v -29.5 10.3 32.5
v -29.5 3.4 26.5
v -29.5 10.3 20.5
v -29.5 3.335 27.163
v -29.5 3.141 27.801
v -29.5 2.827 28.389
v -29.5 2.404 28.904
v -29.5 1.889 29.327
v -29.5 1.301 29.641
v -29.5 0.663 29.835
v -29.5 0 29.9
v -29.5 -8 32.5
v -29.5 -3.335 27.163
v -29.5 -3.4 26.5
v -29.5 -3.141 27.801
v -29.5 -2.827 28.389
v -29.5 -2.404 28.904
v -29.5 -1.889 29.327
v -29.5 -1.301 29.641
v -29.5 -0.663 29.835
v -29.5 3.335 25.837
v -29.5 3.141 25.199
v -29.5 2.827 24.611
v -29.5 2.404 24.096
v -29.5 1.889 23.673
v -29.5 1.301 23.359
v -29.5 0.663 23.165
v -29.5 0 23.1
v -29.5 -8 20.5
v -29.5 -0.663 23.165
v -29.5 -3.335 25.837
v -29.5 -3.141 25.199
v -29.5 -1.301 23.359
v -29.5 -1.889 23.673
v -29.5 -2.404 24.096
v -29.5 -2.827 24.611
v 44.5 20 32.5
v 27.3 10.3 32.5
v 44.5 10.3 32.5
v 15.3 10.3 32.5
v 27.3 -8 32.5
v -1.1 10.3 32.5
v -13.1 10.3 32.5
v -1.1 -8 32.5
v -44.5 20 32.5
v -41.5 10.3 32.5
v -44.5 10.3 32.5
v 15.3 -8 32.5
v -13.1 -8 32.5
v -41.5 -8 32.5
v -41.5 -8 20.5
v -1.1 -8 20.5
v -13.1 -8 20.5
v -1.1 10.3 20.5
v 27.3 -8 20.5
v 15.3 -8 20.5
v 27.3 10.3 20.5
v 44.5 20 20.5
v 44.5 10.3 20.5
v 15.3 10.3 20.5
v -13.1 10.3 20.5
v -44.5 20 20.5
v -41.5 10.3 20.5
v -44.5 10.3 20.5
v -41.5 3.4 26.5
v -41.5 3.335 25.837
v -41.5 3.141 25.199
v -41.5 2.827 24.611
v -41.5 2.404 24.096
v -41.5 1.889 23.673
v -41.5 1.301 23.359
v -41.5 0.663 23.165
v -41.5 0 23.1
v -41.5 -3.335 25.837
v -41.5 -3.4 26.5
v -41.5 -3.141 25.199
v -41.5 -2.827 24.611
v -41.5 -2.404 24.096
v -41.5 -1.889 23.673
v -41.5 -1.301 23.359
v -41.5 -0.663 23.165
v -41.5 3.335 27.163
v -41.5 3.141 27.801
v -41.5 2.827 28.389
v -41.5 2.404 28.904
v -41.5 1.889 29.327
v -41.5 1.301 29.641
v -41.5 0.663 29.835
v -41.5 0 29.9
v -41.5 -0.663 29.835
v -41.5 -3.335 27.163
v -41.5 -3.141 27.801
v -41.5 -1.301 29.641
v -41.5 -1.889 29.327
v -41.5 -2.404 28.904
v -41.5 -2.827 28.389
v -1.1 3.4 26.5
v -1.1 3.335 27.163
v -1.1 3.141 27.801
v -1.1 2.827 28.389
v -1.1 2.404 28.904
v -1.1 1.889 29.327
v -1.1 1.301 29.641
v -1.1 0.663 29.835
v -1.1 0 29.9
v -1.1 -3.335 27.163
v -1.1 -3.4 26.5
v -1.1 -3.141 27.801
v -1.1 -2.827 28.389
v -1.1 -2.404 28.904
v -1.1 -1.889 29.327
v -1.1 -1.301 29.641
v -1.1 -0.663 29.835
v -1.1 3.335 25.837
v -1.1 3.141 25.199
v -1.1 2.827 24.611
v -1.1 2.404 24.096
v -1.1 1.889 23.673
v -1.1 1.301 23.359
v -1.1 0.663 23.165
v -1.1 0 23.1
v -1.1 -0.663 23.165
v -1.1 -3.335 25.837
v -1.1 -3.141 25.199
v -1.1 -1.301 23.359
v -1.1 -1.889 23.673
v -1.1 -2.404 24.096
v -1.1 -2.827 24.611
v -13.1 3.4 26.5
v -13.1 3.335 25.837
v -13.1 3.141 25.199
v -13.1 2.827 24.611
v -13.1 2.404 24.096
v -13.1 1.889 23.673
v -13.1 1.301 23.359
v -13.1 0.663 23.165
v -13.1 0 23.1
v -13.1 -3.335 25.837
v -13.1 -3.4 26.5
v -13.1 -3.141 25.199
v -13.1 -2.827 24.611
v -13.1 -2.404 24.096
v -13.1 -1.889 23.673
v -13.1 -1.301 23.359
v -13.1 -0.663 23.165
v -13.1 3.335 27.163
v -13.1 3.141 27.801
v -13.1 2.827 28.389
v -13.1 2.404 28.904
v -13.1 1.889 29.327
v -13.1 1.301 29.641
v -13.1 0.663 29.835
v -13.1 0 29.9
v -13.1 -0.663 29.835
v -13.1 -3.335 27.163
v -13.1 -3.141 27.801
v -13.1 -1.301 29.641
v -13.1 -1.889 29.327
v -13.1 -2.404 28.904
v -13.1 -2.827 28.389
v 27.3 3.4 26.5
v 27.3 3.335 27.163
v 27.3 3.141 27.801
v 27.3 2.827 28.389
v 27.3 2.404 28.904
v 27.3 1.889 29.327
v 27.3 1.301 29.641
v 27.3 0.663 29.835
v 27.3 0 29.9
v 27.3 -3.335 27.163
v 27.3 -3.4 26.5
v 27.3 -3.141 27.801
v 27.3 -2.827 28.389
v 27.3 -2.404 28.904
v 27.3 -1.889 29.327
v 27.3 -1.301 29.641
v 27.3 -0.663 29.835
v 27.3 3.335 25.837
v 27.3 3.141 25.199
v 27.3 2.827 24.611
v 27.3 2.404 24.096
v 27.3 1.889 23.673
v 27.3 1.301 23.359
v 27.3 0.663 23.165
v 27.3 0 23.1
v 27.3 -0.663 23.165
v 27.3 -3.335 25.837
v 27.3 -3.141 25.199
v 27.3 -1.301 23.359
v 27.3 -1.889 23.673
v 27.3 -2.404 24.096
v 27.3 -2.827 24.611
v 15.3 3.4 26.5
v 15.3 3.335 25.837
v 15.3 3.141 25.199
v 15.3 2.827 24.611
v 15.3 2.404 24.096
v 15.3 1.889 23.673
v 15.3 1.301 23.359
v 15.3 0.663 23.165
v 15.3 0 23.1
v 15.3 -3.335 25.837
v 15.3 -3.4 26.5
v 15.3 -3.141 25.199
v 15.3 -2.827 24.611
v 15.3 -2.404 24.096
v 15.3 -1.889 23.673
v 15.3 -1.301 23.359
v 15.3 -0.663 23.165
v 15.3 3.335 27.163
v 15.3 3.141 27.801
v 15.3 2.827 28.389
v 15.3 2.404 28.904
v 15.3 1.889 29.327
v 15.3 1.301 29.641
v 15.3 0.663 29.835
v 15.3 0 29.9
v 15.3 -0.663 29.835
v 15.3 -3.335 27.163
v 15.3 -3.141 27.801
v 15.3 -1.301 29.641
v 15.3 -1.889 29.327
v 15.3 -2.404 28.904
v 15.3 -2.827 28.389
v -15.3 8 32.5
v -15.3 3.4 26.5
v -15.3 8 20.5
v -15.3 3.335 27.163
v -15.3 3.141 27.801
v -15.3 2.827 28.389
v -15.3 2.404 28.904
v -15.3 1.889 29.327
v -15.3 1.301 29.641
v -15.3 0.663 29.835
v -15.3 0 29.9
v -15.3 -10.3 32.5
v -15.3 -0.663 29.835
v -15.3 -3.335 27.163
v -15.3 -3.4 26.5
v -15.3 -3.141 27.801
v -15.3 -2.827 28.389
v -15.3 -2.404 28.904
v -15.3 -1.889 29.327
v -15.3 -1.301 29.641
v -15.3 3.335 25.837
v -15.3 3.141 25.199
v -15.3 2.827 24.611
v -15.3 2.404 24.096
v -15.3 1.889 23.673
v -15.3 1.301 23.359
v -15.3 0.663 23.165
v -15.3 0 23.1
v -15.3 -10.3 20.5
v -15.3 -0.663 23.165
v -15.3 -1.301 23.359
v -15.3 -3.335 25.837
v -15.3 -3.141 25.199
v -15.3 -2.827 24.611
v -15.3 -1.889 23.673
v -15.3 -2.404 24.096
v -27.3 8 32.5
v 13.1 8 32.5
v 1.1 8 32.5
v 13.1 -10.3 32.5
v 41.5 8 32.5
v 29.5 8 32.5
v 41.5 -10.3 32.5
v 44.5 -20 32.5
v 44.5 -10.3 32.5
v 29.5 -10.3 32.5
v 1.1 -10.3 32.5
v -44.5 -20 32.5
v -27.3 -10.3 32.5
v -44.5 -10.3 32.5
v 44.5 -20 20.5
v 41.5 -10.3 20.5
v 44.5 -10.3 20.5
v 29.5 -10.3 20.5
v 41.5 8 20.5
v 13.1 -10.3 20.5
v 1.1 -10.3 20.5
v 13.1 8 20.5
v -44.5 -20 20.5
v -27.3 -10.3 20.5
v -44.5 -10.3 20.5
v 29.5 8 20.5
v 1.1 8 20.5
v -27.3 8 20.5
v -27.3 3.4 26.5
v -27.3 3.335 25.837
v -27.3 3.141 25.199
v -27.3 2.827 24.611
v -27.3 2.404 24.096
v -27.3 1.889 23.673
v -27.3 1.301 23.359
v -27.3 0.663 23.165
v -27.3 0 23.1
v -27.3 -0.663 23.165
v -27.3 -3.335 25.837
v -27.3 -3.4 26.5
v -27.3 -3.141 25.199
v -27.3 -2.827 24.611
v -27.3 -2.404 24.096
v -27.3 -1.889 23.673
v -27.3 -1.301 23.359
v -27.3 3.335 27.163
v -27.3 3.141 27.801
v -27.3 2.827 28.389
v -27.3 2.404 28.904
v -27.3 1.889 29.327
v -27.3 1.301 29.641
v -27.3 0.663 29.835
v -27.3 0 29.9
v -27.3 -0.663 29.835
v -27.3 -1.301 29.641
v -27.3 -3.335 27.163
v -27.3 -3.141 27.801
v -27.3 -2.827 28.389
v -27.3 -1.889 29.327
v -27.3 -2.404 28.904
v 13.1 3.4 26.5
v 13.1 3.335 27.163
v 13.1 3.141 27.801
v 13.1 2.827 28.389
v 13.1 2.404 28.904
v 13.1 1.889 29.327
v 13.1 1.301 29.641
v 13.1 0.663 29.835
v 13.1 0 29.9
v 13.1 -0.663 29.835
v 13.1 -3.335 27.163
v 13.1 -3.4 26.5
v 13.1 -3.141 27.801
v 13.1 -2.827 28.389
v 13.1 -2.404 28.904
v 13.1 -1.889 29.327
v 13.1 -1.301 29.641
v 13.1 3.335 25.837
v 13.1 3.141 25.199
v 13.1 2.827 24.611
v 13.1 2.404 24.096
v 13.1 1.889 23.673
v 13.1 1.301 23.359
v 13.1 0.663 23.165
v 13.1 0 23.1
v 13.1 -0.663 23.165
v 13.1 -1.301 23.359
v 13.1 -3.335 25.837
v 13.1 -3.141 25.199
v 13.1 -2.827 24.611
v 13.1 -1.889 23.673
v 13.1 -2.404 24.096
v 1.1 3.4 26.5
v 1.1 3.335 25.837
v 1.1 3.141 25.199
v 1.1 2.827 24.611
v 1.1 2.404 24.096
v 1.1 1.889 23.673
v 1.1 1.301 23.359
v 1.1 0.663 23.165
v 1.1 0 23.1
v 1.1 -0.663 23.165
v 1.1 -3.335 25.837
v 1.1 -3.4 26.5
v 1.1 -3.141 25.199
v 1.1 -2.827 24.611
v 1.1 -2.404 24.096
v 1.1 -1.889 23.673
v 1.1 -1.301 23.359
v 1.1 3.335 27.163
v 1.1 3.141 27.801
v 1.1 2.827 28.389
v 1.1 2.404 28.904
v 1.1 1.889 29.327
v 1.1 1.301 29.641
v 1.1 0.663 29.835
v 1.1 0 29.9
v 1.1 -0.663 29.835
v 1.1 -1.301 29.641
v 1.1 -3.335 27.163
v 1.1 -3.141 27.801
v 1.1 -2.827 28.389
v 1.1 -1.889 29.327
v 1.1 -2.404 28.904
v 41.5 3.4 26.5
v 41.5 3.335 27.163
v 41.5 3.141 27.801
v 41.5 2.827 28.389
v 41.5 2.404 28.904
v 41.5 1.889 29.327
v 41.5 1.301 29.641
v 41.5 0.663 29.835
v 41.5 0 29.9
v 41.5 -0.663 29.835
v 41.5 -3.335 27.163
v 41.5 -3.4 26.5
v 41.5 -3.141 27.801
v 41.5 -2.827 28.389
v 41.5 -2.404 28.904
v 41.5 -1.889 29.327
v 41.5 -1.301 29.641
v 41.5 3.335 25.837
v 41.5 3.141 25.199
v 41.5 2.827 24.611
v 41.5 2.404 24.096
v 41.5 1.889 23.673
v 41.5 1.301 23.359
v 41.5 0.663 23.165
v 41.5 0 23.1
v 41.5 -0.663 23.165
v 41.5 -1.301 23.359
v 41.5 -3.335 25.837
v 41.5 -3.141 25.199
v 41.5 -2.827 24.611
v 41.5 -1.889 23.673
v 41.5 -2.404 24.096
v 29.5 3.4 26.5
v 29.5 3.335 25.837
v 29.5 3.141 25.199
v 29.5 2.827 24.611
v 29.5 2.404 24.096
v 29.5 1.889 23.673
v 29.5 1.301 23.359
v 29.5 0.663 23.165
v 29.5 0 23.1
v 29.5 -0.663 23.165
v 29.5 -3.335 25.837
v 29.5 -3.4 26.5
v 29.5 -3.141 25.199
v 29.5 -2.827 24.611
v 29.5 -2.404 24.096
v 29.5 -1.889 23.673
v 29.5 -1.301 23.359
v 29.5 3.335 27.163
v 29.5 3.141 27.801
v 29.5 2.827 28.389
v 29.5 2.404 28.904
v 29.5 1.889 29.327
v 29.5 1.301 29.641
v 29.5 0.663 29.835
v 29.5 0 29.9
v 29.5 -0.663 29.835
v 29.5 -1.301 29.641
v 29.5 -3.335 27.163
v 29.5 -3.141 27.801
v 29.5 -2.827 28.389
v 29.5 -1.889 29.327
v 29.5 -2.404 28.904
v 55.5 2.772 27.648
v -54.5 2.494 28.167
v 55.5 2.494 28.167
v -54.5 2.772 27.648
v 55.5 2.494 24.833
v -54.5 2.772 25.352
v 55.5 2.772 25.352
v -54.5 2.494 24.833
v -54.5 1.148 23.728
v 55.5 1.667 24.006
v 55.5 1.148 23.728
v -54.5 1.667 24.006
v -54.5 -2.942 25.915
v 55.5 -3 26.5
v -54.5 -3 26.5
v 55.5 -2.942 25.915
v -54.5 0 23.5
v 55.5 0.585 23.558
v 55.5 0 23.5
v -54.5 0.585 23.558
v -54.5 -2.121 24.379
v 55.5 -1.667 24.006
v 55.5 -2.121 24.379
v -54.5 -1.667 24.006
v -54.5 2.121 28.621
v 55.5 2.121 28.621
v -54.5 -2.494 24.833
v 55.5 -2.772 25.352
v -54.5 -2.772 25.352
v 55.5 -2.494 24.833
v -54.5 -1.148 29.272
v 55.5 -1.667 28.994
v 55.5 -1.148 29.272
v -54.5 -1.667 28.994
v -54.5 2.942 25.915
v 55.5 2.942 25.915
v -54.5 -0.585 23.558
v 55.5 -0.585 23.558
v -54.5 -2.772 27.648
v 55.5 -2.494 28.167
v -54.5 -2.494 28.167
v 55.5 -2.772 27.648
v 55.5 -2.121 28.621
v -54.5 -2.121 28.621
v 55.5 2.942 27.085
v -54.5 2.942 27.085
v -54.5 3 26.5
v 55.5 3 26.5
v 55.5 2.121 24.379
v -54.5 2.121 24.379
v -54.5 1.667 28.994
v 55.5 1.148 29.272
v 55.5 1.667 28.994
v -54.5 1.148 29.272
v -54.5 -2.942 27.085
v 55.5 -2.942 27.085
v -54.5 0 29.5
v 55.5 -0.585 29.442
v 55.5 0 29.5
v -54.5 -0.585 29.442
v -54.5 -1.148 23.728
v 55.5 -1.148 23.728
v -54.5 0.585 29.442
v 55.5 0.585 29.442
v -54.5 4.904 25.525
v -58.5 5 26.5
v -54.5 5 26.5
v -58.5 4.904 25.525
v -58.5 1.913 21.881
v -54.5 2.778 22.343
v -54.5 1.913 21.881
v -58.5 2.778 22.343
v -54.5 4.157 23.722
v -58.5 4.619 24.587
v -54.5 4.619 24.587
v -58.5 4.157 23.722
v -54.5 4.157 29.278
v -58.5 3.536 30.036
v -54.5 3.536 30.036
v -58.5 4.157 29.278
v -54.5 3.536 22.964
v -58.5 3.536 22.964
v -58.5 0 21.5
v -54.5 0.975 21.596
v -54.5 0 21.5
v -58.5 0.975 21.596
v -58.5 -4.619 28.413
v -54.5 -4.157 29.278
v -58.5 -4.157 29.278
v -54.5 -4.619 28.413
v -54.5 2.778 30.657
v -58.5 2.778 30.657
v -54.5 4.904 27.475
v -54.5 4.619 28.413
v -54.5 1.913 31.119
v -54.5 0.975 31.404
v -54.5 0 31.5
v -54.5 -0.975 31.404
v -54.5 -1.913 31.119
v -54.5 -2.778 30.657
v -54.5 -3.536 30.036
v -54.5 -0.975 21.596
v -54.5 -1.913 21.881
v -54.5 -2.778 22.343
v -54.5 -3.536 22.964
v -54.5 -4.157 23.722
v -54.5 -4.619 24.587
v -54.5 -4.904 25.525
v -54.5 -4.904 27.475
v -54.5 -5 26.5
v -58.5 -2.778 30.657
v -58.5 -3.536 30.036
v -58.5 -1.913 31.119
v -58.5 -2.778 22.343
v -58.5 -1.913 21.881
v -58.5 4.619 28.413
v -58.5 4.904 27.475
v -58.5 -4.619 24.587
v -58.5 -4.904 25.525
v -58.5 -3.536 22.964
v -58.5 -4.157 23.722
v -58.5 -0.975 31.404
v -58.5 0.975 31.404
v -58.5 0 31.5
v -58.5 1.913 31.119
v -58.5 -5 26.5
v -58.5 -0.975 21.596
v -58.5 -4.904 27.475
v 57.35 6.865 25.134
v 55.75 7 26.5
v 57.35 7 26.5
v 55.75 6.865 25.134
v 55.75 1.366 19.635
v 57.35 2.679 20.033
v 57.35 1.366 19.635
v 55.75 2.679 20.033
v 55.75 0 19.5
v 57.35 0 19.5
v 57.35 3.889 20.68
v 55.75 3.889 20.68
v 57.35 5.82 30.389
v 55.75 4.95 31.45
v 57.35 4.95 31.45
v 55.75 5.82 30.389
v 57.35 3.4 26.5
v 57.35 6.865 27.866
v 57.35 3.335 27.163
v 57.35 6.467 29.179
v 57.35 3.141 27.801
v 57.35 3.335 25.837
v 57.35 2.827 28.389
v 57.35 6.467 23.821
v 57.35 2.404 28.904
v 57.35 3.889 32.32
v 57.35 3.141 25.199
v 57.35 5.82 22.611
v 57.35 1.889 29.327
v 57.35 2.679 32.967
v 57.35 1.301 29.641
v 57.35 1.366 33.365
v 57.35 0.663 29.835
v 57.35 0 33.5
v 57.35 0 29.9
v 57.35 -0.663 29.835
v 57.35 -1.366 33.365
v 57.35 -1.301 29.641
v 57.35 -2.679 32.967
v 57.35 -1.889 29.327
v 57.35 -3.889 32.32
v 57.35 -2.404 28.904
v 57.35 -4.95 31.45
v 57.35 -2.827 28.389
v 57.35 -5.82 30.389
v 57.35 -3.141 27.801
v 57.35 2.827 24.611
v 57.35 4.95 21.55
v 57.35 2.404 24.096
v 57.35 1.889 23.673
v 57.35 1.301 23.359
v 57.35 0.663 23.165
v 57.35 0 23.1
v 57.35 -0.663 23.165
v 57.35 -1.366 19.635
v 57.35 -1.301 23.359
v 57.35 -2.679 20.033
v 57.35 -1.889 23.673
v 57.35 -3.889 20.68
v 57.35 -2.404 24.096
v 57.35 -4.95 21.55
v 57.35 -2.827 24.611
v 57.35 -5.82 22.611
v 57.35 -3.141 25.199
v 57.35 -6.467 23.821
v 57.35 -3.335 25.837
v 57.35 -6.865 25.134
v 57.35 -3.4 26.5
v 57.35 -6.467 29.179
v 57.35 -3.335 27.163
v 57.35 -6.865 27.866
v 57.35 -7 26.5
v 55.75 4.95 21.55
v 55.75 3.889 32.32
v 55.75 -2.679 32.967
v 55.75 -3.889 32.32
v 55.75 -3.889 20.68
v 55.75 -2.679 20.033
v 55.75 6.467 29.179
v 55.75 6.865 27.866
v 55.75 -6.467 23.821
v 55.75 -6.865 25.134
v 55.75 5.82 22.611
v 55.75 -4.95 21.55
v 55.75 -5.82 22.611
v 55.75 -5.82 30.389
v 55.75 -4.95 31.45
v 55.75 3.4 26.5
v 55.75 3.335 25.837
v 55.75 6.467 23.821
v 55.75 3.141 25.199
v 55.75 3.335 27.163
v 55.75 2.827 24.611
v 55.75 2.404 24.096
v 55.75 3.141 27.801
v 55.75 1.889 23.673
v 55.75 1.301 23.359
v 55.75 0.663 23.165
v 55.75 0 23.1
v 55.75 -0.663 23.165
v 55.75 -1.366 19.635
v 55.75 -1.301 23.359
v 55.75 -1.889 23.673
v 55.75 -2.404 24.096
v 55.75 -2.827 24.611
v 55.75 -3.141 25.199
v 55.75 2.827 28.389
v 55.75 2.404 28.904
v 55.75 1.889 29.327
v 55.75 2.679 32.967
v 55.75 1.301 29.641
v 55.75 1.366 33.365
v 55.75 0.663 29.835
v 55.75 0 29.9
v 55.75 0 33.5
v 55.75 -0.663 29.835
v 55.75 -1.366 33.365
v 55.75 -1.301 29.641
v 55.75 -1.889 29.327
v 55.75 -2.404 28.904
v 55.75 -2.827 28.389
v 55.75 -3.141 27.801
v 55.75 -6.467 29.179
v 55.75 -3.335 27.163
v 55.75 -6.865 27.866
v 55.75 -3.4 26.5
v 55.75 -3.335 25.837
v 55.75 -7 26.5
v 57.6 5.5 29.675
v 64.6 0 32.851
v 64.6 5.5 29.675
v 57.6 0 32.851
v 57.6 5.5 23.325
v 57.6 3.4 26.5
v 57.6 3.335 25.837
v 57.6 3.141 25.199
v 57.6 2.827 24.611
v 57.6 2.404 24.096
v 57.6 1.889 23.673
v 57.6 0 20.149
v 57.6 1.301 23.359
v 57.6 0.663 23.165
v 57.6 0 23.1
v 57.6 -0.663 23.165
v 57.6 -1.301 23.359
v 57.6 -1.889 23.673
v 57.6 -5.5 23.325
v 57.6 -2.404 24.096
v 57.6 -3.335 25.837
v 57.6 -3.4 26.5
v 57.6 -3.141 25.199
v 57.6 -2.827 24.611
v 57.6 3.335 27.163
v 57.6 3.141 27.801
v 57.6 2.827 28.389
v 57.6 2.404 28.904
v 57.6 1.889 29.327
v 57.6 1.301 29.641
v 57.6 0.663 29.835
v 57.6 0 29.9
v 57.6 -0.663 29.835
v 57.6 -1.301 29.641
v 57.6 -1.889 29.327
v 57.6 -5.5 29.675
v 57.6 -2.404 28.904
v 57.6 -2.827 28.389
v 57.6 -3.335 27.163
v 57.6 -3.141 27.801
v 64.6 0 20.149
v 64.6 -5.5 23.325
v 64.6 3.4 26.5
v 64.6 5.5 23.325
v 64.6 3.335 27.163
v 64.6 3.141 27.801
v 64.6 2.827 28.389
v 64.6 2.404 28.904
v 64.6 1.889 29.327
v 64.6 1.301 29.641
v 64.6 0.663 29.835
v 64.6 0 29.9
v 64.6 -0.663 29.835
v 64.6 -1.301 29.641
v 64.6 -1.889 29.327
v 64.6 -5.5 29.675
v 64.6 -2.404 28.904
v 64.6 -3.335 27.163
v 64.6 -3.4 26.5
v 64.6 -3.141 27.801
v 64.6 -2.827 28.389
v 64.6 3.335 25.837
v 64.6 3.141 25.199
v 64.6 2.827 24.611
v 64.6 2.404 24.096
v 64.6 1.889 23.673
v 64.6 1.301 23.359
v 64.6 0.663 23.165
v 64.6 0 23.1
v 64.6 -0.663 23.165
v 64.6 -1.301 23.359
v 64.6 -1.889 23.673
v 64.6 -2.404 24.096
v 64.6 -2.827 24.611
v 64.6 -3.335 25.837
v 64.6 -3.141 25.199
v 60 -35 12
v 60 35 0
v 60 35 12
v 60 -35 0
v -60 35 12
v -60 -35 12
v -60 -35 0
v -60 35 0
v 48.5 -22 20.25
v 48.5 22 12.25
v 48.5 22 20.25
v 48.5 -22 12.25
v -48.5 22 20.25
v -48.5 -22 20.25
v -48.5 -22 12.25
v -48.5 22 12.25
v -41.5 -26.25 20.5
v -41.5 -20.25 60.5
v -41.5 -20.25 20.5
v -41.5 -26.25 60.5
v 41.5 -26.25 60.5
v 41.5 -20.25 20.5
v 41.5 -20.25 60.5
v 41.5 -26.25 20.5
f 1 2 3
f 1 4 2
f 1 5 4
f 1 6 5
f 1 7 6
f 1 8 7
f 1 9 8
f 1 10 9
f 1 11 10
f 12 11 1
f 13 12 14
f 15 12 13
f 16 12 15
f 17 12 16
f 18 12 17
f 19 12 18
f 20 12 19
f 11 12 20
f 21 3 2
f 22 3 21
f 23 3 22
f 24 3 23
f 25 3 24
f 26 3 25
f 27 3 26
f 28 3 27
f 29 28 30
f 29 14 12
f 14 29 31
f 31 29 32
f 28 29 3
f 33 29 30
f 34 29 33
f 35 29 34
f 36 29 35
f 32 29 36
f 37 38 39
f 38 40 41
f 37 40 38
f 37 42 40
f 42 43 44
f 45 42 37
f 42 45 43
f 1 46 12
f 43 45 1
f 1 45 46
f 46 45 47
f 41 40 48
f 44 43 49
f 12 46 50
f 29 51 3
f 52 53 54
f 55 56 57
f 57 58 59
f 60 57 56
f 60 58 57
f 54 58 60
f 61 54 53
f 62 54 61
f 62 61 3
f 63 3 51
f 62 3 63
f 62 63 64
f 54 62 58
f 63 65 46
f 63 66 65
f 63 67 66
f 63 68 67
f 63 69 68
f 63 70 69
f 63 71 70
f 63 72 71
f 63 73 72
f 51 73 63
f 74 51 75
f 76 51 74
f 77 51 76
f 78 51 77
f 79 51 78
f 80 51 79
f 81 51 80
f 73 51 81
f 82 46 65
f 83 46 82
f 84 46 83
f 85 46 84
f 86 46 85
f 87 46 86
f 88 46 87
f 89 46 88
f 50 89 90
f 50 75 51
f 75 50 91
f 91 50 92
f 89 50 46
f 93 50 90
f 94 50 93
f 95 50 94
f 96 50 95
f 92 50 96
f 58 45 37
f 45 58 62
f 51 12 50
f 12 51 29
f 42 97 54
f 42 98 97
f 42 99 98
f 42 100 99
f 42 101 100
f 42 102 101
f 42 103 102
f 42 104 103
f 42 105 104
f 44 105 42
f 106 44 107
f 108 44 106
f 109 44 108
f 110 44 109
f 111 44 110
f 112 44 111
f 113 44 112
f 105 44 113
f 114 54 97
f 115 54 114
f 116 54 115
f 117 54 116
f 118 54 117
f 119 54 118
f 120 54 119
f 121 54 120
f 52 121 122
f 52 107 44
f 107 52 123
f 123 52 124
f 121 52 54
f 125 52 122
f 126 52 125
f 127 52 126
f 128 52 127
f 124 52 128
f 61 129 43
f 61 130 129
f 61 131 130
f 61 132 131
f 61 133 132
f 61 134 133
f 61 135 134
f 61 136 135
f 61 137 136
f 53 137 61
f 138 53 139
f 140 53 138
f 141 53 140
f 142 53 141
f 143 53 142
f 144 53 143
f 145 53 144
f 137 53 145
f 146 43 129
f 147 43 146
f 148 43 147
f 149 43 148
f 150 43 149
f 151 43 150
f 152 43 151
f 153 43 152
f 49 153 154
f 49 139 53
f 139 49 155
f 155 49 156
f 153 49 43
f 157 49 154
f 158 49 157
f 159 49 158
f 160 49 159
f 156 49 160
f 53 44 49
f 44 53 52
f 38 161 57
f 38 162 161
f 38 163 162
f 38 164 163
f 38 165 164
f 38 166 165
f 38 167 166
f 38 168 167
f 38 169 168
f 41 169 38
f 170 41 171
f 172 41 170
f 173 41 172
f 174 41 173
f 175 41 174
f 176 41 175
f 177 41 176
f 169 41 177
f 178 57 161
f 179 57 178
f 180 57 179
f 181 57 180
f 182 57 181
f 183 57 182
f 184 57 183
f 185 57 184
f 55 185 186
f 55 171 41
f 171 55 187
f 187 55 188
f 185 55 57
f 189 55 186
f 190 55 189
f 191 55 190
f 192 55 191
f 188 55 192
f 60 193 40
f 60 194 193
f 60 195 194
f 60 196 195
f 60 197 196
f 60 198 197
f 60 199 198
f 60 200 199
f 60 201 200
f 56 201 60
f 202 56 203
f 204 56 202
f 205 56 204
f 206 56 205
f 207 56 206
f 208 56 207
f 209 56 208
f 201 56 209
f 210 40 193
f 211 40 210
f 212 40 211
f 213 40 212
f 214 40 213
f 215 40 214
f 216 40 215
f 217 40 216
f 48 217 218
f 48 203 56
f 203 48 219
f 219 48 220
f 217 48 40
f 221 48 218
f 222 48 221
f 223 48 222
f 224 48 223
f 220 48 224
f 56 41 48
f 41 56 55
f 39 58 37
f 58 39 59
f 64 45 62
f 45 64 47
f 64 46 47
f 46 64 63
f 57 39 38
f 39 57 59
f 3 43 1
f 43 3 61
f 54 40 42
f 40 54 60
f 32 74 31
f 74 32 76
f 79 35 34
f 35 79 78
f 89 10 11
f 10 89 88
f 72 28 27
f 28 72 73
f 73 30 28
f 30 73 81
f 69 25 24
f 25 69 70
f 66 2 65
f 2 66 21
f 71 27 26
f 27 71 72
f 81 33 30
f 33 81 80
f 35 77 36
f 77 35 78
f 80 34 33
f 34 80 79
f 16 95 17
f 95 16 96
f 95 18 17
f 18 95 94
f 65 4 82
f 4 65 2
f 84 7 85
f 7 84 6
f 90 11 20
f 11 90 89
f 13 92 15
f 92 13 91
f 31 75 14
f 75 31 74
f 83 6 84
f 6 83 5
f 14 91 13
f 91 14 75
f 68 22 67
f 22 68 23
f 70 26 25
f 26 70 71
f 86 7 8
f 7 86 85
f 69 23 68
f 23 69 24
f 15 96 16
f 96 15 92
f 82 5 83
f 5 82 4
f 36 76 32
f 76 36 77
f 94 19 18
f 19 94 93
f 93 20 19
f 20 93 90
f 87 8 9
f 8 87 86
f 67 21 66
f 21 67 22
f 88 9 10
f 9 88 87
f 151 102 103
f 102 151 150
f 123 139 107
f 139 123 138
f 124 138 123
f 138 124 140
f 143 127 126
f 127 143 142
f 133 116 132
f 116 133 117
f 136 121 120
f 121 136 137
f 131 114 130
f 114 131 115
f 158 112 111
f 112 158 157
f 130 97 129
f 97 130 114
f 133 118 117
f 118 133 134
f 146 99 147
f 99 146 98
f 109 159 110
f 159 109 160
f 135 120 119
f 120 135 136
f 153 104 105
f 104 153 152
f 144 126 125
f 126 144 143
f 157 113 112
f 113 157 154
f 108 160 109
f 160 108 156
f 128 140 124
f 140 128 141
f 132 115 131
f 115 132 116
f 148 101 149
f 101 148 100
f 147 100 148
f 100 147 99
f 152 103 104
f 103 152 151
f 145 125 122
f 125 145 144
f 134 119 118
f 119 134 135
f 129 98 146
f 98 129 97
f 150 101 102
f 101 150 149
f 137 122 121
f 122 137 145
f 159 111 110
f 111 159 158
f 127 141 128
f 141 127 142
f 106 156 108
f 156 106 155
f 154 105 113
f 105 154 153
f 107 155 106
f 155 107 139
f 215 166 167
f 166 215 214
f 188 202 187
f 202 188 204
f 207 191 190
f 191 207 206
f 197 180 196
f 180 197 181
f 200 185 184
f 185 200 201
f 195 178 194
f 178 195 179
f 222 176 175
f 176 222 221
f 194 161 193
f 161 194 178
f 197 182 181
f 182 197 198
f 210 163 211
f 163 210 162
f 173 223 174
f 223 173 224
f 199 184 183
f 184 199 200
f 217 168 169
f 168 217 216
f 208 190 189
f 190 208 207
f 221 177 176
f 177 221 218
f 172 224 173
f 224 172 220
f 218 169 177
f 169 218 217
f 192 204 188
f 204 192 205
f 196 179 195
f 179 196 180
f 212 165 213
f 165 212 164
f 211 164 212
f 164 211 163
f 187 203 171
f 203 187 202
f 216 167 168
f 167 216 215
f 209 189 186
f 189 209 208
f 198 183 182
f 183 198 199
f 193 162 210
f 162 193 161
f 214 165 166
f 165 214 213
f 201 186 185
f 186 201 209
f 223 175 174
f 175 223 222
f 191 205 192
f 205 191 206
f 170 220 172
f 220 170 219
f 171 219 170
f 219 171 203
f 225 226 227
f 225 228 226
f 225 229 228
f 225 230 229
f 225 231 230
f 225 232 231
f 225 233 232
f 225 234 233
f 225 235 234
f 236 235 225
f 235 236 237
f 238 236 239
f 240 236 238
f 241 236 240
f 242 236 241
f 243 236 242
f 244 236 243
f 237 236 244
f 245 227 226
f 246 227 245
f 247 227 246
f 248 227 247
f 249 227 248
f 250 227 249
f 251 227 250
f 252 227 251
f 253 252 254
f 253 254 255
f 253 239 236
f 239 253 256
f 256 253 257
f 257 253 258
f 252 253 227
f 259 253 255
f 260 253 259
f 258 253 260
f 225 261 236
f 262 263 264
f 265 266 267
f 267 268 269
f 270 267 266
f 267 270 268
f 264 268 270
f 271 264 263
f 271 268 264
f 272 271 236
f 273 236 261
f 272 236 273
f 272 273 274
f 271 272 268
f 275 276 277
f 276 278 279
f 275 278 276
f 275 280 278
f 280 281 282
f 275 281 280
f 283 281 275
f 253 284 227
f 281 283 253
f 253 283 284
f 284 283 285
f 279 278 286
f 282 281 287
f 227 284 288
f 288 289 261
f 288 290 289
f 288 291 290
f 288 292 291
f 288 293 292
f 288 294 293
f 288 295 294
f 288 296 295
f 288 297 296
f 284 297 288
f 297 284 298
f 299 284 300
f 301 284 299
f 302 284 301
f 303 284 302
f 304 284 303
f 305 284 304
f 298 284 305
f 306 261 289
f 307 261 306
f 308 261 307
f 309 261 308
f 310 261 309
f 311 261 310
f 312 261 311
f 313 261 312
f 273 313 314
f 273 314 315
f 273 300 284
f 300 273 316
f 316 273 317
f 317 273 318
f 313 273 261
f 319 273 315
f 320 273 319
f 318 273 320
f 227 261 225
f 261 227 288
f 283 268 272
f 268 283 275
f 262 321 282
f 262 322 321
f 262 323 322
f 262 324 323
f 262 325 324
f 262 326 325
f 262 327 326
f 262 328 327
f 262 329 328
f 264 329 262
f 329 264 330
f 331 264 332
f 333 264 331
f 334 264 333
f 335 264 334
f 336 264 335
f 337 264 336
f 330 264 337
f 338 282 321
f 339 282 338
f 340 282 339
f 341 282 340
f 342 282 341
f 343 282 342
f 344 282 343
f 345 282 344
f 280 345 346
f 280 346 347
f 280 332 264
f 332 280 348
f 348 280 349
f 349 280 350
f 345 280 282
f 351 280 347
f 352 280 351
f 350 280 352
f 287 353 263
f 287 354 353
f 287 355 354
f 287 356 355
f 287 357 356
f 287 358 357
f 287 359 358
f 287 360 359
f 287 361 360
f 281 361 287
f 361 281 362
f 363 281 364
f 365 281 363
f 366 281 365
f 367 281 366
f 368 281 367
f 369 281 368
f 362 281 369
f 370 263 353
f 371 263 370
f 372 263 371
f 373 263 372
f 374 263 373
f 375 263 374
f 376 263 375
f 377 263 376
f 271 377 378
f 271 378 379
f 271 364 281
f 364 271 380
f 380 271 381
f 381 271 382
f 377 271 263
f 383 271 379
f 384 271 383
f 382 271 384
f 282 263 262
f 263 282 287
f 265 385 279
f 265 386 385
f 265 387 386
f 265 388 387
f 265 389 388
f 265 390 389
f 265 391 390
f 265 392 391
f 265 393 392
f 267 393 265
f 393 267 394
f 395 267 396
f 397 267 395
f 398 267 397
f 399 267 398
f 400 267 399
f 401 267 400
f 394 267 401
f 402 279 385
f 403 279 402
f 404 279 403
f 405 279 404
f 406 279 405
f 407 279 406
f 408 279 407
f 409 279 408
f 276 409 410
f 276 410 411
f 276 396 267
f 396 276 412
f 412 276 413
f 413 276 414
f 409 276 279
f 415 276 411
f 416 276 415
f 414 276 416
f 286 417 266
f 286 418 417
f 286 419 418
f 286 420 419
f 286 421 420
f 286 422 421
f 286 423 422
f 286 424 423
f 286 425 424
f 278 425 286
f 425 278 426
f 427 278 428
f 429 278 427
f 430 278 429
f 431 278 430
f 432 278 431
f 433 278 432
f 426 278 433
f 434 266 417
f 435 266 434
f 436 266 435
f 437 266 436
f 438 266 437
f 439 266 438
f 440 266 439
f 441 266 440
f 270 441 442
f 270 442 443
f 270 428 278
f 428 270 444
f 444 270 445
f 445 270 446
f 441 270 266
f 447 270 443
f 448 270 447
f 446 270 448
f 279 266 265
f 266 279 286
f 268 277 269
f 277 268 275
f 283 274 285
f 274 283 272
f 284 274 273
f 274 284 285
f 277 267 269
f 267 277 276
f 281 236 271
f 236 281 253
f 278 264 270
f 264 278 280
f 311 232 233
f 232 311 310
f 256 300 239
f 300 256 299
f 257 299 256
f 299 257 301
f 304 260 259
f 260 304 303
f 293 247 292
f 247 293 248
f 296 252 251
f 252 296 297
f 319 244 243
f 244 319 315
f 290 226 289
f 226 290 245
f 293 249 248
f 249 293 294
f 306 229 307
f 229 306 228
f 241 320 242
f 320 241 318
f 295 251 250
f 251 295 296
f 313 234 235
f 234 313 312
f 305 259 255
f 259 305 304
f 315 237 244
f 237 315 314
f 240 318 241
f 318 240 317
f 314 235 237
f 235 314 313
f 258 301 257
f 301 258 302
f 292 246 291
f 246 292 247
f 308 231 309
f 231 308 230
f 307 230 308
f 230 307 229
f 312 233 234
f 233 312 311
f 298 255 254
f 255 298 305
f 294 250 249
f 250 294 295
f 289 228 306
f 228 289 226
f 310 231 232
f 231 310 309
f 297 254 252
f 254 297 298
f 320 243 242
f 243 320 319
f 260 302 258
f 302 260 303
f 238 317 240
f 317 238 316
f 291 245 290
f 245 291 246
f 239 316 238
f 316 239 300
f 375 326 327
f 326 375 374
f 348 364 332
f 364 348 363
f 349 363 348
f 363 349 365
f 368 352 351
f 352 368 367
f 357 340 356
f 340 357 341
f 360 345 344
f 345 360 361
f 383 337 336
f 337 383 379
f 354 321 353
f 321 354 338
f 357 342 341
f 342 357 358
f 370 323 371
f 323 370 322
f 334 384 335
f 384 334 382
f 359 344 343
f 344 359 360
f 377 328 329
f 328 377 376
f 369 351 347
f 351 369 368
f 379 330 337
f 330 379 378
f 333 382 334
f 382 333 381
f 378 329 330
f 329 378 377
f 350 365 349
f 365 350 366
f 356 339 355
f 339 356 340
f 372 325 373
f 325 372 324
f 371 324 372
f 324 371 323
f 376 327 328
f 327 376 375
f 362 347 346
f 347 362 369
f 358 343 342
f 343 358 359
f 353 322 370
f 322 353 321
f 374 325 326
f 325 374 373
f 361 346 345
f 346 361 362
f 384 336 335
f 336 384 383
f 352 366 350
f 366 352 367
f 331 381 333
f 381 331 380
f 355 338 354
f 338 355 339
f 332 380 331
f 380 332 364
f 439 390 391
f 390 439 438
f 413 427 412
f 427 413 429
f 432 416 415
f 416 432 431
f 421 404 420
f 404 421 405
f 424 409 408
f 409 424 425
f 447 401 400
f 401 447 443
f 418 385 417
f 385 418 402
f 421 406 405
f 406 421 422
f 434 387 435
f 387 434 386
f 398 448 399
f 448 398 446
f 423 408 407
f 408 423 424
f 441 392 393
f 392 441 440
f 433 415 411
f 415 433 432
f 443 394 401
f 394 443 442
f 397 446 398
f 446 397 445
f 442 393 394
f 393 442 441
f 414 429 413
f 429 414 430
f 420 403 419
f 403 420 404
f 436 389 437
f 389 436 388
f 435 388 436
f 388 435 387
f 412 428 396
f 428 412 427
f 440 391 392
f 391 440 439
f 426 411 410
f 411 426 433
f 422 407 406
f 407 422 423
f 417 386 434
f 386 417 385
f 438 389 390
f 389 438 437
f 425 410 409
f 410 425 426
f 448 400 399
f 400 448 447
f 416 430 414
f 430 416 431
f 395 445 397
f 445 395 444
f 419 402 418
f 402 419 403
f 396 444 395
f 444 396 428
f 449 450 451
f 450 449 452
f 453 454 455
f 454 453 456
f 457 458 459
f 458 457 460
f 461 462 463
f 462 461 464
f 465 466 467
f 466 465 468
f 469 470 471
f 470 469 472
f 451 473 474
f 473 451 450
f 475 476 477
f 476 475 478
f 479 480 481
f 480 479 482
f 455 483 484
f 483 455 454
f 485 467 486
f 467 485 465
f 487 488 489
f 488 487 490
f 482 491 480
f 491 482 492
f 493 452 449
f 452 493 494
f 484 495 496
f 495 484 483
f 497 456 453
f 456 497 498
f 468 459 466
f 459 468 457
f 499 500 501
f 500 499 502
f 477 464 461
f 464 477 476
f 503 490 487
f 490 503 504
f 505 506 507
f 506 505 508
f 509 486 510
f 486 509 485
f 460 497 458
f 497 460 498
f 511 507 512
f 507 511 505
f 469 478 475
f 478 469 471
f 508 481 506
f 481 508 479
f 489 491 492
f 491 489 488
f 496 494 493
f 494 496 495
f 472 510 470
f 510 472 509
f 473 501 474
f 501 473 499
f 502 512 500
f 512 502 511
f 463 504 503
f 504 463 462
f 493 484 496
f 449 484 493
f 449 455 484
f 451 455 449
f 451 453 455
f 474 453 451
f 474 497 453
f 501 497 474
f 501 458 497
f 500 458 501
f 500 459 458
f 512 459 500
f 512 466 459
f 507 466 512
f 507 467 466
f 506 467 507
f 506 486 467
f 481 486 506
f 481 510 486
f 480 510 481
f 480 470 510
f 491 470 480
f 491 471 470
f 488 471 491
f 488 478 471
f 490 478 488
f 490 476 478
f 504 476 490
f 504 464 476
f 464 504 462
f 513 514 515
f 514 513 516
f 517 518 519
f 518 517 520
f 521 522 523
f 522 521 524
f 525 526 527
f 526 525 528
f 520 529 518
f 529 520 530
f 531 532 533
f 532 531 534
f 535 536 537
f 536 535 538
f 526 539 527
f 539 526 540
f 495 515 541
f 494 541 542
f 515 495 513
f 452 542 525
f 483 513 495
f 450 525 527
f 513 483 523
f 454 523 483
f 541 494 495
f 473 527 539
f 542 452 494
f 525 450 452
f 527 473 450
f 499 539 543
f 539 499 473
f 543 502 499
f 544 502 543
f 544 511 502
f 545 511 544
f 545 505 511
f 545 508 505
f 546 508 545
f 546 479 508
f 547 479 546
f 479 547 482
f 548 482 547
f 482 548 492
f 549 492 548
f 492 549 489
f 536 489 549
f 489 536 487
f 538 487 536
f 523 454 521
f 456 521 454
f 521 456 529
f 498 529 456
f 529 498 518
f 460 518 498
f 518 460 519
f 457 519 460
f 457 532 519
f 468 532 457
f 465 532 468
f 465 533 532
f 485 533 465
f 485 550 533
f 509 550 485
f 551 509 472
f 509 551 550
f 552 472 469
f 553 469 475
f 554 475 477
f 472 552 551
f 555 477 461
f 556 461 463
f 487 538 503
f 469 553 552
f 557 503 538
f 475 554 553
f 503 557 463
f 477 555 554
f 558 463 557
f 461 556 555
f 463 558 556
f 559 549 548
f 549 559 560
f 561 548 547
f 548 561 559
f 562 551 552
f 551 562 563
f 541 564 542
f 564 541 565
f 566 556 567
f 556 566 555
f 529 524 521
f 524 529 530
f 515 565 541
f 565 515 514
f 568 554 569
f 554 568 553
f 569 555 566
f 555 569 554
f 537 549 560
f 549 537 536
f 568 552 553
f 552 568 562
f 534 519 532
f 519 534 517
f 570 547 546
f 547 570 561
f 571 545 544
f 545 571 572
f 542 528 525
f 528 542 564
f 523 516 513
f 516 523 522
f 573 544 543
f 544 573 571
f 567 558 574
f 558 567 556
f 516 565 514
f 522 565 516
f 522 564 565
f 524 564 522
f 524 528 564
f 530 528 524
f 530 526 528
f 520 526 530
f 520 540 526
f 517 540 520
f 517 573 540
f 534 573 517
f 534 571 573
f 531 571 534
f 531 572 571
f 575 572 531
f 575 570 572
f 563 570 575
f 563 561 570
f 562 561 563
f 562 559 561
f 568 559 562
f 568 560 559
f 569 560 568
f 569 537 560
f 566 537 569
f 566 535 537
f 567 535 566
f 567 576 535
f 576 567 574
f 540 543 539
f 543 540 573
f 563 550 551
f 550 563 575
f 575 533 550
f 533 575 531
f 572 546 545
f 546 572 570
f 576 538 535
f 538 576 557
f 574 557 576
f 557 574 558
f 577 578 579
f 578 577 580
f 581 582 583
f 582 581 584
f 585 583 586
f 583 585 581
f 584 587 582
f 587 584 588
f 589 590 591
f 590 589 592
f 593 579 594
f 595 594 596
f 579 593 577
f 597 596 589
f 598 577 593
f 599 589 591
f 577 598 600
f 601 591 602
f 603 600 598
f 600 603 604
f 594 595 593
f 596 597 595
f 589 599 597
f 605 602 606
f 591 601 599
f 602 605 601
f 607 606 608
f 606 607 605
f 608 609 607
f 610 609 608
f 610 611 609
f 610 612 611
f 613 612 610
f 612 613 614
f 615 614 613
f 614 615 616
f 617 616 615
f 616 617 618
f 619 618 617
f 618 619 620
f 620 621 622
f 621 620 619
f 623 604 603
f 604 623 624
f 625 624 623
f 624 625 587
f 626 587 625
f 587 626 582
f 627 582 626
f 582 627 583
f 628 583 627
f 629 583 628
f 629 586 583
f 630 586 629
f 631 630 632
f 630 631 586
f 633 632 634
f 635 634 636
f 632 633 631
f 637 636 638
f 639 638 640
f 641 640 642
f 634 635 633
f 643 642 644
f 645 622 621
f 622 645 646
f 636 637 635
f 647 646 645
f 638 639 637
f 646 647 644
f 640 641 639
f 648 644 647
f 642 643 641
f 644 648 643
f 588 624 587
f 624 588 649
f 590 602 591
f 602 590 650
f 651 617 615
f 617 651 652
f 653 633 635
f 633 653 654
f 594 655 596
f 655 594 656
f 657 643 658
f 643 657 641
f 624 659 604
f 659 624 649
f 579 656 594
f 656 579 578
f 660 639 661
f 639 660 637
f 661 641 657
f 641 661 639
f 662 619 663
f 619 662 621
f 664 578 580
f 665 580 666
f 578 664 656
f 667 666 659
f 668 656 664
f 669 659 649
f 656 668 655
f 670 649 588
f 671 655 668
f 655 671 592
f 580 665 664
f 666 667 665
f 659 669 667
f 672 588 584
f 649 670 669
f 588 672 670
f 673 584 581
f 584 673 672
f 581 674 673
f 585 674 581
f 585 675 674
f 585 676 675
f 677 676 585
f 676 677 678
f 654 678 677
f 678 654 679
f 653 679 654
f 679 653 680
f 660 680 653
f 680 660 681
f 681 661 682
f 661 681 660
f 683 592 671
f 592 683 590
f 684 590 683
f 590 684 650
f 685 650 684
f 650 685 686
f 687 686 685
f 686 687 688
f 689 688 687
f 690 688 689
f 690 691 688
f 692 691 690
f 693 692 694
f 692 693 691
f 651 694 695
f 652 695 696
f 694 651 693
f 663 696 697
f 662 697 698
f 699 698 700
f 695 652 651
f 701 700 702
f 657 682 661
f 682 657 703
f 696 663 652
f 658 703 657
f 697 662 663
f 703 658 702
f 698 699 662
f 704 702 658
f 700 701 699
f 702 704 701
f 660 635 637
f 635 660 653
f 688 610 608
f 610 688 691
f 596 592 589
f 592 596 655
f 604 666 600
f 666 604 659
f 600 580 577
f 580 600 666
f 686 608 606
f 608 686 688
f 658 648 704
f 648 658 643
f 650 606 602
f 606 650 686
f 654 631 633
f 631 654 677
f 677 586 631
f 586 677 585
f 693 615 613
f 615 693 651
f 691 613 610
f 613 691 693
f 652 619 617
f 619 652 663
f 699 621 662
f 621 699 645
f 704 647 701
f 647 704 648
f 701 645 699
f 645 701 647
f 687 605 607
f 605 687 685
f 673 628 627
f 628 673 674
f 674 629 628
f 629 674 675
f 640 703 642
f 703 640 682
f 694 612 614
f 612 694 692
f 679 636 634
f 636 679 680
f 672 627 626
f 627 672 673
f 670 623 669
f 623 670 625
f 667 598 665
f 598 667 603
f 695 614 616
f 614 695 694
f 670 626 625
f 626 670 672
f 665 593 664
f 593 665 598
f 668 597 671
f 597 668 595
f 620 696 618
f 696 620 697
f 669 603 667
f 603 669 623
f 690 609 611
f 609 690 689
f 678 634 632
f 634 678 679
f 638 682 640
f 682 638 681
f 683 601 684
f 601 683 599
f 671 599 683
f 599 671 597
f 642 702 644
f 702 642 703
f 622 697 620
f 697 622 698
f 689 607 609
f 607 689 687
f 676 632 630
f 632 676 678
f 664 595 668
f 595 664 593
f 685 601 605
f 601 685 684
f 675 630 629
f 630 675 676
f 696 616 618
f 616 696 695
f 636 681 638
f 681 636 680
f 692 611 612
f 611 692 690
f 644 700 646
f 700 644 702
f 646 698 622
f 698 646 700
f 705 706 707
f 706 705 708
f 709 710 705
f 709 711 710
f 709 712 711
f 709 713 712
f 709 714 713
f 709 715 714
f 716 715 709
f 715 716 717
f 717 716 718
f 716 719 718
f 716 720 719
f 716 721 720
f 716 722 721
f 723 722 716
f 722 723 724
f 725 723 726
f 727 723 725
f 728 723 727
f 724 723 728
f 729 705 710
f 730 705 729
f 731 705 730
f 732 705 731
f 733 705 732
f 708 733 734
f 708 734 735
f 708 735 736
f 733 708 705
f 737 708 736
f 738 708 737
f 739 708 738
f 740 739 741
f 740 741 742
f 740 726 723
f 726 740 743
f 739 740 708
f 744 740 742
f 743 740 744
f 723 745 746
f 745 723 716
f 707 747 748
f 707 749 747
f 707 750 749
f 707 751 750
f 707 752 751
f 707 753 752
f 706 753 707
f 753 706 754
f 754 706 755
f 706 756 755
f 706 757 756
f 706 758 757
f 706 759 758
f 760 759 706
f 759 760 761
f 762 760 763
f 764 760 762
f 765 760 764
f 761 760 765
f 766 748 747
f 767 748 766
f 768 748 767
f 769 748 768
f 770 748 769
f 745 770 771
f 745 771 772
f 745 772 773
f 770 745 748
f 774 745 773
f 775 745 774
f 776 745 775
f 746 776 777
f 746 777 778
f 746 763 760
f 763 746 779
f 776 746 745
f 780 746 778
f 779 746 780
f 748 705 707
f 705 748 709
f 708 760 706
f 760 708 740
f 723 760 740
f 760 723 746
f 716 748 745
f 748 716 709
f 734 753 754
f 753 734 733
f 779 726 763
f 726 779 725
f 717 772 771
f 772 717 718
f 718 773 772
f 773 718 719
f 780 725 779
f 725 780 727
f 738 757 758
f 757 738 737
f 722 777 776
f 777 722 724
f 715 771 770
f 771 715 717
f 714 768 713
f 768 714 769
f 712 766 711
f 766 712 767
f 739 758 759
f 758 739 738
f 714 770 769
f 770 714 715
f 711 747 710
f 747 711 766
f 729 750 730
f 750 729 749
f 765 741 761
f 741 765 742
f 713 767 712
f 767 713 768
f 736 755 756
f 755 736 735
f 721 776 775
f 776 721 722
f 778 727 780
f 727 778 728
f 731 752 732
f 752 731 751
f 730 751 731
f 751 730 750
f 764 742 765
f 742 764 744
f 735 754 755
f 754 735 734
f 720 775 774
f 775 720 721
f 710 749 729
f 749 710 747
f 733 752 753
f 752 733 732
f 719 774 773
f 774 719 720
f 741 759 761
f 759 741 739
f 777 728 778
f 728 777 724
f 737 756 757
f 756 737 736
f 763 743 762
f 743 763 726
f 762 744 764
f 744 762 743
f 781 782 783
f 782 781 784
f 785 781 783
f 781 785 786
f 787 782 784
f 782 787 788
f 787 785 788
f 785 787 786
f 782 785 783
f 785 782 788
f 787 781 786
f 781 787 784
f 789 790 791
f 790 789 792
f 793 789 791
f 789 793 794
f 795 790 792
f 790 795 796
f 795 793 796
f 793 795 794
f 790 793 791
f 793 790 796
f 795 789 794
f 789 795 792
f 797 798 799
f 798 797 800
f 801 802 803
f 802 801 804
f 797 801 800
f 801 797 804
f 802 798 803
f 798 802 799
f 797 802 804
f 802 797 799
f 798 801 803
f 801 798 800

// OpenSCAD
$fn = 32;

// ------------------------------------------------------------------------
// Comb hinge with flap: leaf 89 x 20 mm, pin d6, flap 40 mm
// Every part is its own module, assembly() places every instance.
// ------------------------------------------------------------------------

// --- part 1 ---
module hinge_bed() {
  difference() {
    translate([-60, -35, 0]) cube([120, 70, 12]);
  }
}

// --- part 2 ---
module hinge_riser() {
  difference() {
    translate([-48.5, -22, 0]) cube([97, 44, 8]);
  }
}

// --- part 3 ---
module hinge_leaf_a() {
  difference() {
    union() {
      translate([-41.5, -8, -6]) cube([12, 28, 12]);
      translate([-13.1, -8, -6]) cube([12, 28, 12]);
      translate([15.3, -8, -6]) cube([12, 28, 12]);
      translate([-44.5, 10.3, -6]) cube([89, 9.7, 12]);
    }
    translate([-35.5, 0, 0]) rotate([0, 90, 0]) cylinder(h = 14, d = 6.8, center = true);
    translate([-7.1, 0, 0]) rotate([0, 90, 0]) cylinder(h = 14, d = 6.8, center = true);
    translate([21.3, 0, 0]) rotate([0, 90, 0]) cylinder(h = 14, d = 6.8, center = true);
  }
}

// --- part 4 ---
module hinge_leaf_b() {
  difference() {
    union() {
      translate([-27.3, -20, -6]) cube([12, 28, 12]);
      translate([1.1, -20, -6]) cube([12, 28, 12]);
      translate([29.5, -20, -6]) cube([12, 28, 12]);
      translate([-44.5, -20, -6]) cube([89, 9.7, 12]);
    }
    translate([-21.3, 0, 0]) rotate([0, 90, 0]) cylinder(h = 14, d = 6.8, center = true);
    translate([7.1, 0, 0]) rotate([0, 90, 0]) cylinder(h = 14, d = 6.8, center = true);
    translate([35.5, 0, 0]) rotate([0, 90, 0]) cylinder(h = 14, d = 6.8, center = true);
  }
}

// --- part 5 ---
module hinge_flap() {
  difference() {
    translate([-41.5, -20, 0]) cube([83, 40, 6]);
  }
}

// --- part 6 ---
module hinge_pin() {
  rotate([0, 90, 0]) cylinder(h = 111, d = 6, center = true);
  translate([-58.5, 0, 0]) rotate([0, 90, 0]) cylinder(h = 4, d = 10);
}

// --- part 7 ---
module pin_washer() {
  difference() {
      translate([0, 0, 0]) cylinder(h = 1.6, d = 14);
      translate([0, 0, -1]) cylinder(h = 3.6, d = 6.8);
    }
}

// --- part 8 ---
module pin_nut() {
  difference() {
    linear_extrude(height = 7) polygon(points = [[6.351, 0], [3.175, 5.5], [-3.175, 5.5], [-6.351, 0], [-3.175, -5.5], [3.175, -5.5]]);
    translate([0, 0, -1]) cylinder(h = 9, d = 6.8);
  }
}

// --- assembly ---
module assembly() {
  color([0.80, 0.24, 0.20]) translate([0, 0, 0]) rotate([0, 0, 0]) hinge_bed();
  color([0.20, 0.45, 0.75]) translate([0, 0, 12.25]) rotate([0, 0, 0]) hinge_riser();
  color([0.25, 0.62, 0.32]) translate([0, 0, 26.5]) rotate([0, 0, 0]) hinge_leaf_a();
  color([0.92, 0.70, 0.18]) translate([0, 0, 26.5]) rotate([0, 0, 0]) hinge_leaf_b();
  color([0.58, 0.35, 0.70]) translate([0, -20.25, 40.5]) rotate([90, 0, 0]) hinge_flap();
  color([0.16, 0.66, 0.66]) translate([0, 0, 26.5]) rotate([0, 0, 0]) hinge_pin();
  color([0.85, 0.48, 0.18]) translate([55.75, 0, 26.5]) rotate([0, 90, 0]) pin_washer();
  color([0.55, 0.60, 0.65]) translate([57.6, 0, 26.5]) rotate([0, 90, 0]) pin_nut();
}

assembly();
